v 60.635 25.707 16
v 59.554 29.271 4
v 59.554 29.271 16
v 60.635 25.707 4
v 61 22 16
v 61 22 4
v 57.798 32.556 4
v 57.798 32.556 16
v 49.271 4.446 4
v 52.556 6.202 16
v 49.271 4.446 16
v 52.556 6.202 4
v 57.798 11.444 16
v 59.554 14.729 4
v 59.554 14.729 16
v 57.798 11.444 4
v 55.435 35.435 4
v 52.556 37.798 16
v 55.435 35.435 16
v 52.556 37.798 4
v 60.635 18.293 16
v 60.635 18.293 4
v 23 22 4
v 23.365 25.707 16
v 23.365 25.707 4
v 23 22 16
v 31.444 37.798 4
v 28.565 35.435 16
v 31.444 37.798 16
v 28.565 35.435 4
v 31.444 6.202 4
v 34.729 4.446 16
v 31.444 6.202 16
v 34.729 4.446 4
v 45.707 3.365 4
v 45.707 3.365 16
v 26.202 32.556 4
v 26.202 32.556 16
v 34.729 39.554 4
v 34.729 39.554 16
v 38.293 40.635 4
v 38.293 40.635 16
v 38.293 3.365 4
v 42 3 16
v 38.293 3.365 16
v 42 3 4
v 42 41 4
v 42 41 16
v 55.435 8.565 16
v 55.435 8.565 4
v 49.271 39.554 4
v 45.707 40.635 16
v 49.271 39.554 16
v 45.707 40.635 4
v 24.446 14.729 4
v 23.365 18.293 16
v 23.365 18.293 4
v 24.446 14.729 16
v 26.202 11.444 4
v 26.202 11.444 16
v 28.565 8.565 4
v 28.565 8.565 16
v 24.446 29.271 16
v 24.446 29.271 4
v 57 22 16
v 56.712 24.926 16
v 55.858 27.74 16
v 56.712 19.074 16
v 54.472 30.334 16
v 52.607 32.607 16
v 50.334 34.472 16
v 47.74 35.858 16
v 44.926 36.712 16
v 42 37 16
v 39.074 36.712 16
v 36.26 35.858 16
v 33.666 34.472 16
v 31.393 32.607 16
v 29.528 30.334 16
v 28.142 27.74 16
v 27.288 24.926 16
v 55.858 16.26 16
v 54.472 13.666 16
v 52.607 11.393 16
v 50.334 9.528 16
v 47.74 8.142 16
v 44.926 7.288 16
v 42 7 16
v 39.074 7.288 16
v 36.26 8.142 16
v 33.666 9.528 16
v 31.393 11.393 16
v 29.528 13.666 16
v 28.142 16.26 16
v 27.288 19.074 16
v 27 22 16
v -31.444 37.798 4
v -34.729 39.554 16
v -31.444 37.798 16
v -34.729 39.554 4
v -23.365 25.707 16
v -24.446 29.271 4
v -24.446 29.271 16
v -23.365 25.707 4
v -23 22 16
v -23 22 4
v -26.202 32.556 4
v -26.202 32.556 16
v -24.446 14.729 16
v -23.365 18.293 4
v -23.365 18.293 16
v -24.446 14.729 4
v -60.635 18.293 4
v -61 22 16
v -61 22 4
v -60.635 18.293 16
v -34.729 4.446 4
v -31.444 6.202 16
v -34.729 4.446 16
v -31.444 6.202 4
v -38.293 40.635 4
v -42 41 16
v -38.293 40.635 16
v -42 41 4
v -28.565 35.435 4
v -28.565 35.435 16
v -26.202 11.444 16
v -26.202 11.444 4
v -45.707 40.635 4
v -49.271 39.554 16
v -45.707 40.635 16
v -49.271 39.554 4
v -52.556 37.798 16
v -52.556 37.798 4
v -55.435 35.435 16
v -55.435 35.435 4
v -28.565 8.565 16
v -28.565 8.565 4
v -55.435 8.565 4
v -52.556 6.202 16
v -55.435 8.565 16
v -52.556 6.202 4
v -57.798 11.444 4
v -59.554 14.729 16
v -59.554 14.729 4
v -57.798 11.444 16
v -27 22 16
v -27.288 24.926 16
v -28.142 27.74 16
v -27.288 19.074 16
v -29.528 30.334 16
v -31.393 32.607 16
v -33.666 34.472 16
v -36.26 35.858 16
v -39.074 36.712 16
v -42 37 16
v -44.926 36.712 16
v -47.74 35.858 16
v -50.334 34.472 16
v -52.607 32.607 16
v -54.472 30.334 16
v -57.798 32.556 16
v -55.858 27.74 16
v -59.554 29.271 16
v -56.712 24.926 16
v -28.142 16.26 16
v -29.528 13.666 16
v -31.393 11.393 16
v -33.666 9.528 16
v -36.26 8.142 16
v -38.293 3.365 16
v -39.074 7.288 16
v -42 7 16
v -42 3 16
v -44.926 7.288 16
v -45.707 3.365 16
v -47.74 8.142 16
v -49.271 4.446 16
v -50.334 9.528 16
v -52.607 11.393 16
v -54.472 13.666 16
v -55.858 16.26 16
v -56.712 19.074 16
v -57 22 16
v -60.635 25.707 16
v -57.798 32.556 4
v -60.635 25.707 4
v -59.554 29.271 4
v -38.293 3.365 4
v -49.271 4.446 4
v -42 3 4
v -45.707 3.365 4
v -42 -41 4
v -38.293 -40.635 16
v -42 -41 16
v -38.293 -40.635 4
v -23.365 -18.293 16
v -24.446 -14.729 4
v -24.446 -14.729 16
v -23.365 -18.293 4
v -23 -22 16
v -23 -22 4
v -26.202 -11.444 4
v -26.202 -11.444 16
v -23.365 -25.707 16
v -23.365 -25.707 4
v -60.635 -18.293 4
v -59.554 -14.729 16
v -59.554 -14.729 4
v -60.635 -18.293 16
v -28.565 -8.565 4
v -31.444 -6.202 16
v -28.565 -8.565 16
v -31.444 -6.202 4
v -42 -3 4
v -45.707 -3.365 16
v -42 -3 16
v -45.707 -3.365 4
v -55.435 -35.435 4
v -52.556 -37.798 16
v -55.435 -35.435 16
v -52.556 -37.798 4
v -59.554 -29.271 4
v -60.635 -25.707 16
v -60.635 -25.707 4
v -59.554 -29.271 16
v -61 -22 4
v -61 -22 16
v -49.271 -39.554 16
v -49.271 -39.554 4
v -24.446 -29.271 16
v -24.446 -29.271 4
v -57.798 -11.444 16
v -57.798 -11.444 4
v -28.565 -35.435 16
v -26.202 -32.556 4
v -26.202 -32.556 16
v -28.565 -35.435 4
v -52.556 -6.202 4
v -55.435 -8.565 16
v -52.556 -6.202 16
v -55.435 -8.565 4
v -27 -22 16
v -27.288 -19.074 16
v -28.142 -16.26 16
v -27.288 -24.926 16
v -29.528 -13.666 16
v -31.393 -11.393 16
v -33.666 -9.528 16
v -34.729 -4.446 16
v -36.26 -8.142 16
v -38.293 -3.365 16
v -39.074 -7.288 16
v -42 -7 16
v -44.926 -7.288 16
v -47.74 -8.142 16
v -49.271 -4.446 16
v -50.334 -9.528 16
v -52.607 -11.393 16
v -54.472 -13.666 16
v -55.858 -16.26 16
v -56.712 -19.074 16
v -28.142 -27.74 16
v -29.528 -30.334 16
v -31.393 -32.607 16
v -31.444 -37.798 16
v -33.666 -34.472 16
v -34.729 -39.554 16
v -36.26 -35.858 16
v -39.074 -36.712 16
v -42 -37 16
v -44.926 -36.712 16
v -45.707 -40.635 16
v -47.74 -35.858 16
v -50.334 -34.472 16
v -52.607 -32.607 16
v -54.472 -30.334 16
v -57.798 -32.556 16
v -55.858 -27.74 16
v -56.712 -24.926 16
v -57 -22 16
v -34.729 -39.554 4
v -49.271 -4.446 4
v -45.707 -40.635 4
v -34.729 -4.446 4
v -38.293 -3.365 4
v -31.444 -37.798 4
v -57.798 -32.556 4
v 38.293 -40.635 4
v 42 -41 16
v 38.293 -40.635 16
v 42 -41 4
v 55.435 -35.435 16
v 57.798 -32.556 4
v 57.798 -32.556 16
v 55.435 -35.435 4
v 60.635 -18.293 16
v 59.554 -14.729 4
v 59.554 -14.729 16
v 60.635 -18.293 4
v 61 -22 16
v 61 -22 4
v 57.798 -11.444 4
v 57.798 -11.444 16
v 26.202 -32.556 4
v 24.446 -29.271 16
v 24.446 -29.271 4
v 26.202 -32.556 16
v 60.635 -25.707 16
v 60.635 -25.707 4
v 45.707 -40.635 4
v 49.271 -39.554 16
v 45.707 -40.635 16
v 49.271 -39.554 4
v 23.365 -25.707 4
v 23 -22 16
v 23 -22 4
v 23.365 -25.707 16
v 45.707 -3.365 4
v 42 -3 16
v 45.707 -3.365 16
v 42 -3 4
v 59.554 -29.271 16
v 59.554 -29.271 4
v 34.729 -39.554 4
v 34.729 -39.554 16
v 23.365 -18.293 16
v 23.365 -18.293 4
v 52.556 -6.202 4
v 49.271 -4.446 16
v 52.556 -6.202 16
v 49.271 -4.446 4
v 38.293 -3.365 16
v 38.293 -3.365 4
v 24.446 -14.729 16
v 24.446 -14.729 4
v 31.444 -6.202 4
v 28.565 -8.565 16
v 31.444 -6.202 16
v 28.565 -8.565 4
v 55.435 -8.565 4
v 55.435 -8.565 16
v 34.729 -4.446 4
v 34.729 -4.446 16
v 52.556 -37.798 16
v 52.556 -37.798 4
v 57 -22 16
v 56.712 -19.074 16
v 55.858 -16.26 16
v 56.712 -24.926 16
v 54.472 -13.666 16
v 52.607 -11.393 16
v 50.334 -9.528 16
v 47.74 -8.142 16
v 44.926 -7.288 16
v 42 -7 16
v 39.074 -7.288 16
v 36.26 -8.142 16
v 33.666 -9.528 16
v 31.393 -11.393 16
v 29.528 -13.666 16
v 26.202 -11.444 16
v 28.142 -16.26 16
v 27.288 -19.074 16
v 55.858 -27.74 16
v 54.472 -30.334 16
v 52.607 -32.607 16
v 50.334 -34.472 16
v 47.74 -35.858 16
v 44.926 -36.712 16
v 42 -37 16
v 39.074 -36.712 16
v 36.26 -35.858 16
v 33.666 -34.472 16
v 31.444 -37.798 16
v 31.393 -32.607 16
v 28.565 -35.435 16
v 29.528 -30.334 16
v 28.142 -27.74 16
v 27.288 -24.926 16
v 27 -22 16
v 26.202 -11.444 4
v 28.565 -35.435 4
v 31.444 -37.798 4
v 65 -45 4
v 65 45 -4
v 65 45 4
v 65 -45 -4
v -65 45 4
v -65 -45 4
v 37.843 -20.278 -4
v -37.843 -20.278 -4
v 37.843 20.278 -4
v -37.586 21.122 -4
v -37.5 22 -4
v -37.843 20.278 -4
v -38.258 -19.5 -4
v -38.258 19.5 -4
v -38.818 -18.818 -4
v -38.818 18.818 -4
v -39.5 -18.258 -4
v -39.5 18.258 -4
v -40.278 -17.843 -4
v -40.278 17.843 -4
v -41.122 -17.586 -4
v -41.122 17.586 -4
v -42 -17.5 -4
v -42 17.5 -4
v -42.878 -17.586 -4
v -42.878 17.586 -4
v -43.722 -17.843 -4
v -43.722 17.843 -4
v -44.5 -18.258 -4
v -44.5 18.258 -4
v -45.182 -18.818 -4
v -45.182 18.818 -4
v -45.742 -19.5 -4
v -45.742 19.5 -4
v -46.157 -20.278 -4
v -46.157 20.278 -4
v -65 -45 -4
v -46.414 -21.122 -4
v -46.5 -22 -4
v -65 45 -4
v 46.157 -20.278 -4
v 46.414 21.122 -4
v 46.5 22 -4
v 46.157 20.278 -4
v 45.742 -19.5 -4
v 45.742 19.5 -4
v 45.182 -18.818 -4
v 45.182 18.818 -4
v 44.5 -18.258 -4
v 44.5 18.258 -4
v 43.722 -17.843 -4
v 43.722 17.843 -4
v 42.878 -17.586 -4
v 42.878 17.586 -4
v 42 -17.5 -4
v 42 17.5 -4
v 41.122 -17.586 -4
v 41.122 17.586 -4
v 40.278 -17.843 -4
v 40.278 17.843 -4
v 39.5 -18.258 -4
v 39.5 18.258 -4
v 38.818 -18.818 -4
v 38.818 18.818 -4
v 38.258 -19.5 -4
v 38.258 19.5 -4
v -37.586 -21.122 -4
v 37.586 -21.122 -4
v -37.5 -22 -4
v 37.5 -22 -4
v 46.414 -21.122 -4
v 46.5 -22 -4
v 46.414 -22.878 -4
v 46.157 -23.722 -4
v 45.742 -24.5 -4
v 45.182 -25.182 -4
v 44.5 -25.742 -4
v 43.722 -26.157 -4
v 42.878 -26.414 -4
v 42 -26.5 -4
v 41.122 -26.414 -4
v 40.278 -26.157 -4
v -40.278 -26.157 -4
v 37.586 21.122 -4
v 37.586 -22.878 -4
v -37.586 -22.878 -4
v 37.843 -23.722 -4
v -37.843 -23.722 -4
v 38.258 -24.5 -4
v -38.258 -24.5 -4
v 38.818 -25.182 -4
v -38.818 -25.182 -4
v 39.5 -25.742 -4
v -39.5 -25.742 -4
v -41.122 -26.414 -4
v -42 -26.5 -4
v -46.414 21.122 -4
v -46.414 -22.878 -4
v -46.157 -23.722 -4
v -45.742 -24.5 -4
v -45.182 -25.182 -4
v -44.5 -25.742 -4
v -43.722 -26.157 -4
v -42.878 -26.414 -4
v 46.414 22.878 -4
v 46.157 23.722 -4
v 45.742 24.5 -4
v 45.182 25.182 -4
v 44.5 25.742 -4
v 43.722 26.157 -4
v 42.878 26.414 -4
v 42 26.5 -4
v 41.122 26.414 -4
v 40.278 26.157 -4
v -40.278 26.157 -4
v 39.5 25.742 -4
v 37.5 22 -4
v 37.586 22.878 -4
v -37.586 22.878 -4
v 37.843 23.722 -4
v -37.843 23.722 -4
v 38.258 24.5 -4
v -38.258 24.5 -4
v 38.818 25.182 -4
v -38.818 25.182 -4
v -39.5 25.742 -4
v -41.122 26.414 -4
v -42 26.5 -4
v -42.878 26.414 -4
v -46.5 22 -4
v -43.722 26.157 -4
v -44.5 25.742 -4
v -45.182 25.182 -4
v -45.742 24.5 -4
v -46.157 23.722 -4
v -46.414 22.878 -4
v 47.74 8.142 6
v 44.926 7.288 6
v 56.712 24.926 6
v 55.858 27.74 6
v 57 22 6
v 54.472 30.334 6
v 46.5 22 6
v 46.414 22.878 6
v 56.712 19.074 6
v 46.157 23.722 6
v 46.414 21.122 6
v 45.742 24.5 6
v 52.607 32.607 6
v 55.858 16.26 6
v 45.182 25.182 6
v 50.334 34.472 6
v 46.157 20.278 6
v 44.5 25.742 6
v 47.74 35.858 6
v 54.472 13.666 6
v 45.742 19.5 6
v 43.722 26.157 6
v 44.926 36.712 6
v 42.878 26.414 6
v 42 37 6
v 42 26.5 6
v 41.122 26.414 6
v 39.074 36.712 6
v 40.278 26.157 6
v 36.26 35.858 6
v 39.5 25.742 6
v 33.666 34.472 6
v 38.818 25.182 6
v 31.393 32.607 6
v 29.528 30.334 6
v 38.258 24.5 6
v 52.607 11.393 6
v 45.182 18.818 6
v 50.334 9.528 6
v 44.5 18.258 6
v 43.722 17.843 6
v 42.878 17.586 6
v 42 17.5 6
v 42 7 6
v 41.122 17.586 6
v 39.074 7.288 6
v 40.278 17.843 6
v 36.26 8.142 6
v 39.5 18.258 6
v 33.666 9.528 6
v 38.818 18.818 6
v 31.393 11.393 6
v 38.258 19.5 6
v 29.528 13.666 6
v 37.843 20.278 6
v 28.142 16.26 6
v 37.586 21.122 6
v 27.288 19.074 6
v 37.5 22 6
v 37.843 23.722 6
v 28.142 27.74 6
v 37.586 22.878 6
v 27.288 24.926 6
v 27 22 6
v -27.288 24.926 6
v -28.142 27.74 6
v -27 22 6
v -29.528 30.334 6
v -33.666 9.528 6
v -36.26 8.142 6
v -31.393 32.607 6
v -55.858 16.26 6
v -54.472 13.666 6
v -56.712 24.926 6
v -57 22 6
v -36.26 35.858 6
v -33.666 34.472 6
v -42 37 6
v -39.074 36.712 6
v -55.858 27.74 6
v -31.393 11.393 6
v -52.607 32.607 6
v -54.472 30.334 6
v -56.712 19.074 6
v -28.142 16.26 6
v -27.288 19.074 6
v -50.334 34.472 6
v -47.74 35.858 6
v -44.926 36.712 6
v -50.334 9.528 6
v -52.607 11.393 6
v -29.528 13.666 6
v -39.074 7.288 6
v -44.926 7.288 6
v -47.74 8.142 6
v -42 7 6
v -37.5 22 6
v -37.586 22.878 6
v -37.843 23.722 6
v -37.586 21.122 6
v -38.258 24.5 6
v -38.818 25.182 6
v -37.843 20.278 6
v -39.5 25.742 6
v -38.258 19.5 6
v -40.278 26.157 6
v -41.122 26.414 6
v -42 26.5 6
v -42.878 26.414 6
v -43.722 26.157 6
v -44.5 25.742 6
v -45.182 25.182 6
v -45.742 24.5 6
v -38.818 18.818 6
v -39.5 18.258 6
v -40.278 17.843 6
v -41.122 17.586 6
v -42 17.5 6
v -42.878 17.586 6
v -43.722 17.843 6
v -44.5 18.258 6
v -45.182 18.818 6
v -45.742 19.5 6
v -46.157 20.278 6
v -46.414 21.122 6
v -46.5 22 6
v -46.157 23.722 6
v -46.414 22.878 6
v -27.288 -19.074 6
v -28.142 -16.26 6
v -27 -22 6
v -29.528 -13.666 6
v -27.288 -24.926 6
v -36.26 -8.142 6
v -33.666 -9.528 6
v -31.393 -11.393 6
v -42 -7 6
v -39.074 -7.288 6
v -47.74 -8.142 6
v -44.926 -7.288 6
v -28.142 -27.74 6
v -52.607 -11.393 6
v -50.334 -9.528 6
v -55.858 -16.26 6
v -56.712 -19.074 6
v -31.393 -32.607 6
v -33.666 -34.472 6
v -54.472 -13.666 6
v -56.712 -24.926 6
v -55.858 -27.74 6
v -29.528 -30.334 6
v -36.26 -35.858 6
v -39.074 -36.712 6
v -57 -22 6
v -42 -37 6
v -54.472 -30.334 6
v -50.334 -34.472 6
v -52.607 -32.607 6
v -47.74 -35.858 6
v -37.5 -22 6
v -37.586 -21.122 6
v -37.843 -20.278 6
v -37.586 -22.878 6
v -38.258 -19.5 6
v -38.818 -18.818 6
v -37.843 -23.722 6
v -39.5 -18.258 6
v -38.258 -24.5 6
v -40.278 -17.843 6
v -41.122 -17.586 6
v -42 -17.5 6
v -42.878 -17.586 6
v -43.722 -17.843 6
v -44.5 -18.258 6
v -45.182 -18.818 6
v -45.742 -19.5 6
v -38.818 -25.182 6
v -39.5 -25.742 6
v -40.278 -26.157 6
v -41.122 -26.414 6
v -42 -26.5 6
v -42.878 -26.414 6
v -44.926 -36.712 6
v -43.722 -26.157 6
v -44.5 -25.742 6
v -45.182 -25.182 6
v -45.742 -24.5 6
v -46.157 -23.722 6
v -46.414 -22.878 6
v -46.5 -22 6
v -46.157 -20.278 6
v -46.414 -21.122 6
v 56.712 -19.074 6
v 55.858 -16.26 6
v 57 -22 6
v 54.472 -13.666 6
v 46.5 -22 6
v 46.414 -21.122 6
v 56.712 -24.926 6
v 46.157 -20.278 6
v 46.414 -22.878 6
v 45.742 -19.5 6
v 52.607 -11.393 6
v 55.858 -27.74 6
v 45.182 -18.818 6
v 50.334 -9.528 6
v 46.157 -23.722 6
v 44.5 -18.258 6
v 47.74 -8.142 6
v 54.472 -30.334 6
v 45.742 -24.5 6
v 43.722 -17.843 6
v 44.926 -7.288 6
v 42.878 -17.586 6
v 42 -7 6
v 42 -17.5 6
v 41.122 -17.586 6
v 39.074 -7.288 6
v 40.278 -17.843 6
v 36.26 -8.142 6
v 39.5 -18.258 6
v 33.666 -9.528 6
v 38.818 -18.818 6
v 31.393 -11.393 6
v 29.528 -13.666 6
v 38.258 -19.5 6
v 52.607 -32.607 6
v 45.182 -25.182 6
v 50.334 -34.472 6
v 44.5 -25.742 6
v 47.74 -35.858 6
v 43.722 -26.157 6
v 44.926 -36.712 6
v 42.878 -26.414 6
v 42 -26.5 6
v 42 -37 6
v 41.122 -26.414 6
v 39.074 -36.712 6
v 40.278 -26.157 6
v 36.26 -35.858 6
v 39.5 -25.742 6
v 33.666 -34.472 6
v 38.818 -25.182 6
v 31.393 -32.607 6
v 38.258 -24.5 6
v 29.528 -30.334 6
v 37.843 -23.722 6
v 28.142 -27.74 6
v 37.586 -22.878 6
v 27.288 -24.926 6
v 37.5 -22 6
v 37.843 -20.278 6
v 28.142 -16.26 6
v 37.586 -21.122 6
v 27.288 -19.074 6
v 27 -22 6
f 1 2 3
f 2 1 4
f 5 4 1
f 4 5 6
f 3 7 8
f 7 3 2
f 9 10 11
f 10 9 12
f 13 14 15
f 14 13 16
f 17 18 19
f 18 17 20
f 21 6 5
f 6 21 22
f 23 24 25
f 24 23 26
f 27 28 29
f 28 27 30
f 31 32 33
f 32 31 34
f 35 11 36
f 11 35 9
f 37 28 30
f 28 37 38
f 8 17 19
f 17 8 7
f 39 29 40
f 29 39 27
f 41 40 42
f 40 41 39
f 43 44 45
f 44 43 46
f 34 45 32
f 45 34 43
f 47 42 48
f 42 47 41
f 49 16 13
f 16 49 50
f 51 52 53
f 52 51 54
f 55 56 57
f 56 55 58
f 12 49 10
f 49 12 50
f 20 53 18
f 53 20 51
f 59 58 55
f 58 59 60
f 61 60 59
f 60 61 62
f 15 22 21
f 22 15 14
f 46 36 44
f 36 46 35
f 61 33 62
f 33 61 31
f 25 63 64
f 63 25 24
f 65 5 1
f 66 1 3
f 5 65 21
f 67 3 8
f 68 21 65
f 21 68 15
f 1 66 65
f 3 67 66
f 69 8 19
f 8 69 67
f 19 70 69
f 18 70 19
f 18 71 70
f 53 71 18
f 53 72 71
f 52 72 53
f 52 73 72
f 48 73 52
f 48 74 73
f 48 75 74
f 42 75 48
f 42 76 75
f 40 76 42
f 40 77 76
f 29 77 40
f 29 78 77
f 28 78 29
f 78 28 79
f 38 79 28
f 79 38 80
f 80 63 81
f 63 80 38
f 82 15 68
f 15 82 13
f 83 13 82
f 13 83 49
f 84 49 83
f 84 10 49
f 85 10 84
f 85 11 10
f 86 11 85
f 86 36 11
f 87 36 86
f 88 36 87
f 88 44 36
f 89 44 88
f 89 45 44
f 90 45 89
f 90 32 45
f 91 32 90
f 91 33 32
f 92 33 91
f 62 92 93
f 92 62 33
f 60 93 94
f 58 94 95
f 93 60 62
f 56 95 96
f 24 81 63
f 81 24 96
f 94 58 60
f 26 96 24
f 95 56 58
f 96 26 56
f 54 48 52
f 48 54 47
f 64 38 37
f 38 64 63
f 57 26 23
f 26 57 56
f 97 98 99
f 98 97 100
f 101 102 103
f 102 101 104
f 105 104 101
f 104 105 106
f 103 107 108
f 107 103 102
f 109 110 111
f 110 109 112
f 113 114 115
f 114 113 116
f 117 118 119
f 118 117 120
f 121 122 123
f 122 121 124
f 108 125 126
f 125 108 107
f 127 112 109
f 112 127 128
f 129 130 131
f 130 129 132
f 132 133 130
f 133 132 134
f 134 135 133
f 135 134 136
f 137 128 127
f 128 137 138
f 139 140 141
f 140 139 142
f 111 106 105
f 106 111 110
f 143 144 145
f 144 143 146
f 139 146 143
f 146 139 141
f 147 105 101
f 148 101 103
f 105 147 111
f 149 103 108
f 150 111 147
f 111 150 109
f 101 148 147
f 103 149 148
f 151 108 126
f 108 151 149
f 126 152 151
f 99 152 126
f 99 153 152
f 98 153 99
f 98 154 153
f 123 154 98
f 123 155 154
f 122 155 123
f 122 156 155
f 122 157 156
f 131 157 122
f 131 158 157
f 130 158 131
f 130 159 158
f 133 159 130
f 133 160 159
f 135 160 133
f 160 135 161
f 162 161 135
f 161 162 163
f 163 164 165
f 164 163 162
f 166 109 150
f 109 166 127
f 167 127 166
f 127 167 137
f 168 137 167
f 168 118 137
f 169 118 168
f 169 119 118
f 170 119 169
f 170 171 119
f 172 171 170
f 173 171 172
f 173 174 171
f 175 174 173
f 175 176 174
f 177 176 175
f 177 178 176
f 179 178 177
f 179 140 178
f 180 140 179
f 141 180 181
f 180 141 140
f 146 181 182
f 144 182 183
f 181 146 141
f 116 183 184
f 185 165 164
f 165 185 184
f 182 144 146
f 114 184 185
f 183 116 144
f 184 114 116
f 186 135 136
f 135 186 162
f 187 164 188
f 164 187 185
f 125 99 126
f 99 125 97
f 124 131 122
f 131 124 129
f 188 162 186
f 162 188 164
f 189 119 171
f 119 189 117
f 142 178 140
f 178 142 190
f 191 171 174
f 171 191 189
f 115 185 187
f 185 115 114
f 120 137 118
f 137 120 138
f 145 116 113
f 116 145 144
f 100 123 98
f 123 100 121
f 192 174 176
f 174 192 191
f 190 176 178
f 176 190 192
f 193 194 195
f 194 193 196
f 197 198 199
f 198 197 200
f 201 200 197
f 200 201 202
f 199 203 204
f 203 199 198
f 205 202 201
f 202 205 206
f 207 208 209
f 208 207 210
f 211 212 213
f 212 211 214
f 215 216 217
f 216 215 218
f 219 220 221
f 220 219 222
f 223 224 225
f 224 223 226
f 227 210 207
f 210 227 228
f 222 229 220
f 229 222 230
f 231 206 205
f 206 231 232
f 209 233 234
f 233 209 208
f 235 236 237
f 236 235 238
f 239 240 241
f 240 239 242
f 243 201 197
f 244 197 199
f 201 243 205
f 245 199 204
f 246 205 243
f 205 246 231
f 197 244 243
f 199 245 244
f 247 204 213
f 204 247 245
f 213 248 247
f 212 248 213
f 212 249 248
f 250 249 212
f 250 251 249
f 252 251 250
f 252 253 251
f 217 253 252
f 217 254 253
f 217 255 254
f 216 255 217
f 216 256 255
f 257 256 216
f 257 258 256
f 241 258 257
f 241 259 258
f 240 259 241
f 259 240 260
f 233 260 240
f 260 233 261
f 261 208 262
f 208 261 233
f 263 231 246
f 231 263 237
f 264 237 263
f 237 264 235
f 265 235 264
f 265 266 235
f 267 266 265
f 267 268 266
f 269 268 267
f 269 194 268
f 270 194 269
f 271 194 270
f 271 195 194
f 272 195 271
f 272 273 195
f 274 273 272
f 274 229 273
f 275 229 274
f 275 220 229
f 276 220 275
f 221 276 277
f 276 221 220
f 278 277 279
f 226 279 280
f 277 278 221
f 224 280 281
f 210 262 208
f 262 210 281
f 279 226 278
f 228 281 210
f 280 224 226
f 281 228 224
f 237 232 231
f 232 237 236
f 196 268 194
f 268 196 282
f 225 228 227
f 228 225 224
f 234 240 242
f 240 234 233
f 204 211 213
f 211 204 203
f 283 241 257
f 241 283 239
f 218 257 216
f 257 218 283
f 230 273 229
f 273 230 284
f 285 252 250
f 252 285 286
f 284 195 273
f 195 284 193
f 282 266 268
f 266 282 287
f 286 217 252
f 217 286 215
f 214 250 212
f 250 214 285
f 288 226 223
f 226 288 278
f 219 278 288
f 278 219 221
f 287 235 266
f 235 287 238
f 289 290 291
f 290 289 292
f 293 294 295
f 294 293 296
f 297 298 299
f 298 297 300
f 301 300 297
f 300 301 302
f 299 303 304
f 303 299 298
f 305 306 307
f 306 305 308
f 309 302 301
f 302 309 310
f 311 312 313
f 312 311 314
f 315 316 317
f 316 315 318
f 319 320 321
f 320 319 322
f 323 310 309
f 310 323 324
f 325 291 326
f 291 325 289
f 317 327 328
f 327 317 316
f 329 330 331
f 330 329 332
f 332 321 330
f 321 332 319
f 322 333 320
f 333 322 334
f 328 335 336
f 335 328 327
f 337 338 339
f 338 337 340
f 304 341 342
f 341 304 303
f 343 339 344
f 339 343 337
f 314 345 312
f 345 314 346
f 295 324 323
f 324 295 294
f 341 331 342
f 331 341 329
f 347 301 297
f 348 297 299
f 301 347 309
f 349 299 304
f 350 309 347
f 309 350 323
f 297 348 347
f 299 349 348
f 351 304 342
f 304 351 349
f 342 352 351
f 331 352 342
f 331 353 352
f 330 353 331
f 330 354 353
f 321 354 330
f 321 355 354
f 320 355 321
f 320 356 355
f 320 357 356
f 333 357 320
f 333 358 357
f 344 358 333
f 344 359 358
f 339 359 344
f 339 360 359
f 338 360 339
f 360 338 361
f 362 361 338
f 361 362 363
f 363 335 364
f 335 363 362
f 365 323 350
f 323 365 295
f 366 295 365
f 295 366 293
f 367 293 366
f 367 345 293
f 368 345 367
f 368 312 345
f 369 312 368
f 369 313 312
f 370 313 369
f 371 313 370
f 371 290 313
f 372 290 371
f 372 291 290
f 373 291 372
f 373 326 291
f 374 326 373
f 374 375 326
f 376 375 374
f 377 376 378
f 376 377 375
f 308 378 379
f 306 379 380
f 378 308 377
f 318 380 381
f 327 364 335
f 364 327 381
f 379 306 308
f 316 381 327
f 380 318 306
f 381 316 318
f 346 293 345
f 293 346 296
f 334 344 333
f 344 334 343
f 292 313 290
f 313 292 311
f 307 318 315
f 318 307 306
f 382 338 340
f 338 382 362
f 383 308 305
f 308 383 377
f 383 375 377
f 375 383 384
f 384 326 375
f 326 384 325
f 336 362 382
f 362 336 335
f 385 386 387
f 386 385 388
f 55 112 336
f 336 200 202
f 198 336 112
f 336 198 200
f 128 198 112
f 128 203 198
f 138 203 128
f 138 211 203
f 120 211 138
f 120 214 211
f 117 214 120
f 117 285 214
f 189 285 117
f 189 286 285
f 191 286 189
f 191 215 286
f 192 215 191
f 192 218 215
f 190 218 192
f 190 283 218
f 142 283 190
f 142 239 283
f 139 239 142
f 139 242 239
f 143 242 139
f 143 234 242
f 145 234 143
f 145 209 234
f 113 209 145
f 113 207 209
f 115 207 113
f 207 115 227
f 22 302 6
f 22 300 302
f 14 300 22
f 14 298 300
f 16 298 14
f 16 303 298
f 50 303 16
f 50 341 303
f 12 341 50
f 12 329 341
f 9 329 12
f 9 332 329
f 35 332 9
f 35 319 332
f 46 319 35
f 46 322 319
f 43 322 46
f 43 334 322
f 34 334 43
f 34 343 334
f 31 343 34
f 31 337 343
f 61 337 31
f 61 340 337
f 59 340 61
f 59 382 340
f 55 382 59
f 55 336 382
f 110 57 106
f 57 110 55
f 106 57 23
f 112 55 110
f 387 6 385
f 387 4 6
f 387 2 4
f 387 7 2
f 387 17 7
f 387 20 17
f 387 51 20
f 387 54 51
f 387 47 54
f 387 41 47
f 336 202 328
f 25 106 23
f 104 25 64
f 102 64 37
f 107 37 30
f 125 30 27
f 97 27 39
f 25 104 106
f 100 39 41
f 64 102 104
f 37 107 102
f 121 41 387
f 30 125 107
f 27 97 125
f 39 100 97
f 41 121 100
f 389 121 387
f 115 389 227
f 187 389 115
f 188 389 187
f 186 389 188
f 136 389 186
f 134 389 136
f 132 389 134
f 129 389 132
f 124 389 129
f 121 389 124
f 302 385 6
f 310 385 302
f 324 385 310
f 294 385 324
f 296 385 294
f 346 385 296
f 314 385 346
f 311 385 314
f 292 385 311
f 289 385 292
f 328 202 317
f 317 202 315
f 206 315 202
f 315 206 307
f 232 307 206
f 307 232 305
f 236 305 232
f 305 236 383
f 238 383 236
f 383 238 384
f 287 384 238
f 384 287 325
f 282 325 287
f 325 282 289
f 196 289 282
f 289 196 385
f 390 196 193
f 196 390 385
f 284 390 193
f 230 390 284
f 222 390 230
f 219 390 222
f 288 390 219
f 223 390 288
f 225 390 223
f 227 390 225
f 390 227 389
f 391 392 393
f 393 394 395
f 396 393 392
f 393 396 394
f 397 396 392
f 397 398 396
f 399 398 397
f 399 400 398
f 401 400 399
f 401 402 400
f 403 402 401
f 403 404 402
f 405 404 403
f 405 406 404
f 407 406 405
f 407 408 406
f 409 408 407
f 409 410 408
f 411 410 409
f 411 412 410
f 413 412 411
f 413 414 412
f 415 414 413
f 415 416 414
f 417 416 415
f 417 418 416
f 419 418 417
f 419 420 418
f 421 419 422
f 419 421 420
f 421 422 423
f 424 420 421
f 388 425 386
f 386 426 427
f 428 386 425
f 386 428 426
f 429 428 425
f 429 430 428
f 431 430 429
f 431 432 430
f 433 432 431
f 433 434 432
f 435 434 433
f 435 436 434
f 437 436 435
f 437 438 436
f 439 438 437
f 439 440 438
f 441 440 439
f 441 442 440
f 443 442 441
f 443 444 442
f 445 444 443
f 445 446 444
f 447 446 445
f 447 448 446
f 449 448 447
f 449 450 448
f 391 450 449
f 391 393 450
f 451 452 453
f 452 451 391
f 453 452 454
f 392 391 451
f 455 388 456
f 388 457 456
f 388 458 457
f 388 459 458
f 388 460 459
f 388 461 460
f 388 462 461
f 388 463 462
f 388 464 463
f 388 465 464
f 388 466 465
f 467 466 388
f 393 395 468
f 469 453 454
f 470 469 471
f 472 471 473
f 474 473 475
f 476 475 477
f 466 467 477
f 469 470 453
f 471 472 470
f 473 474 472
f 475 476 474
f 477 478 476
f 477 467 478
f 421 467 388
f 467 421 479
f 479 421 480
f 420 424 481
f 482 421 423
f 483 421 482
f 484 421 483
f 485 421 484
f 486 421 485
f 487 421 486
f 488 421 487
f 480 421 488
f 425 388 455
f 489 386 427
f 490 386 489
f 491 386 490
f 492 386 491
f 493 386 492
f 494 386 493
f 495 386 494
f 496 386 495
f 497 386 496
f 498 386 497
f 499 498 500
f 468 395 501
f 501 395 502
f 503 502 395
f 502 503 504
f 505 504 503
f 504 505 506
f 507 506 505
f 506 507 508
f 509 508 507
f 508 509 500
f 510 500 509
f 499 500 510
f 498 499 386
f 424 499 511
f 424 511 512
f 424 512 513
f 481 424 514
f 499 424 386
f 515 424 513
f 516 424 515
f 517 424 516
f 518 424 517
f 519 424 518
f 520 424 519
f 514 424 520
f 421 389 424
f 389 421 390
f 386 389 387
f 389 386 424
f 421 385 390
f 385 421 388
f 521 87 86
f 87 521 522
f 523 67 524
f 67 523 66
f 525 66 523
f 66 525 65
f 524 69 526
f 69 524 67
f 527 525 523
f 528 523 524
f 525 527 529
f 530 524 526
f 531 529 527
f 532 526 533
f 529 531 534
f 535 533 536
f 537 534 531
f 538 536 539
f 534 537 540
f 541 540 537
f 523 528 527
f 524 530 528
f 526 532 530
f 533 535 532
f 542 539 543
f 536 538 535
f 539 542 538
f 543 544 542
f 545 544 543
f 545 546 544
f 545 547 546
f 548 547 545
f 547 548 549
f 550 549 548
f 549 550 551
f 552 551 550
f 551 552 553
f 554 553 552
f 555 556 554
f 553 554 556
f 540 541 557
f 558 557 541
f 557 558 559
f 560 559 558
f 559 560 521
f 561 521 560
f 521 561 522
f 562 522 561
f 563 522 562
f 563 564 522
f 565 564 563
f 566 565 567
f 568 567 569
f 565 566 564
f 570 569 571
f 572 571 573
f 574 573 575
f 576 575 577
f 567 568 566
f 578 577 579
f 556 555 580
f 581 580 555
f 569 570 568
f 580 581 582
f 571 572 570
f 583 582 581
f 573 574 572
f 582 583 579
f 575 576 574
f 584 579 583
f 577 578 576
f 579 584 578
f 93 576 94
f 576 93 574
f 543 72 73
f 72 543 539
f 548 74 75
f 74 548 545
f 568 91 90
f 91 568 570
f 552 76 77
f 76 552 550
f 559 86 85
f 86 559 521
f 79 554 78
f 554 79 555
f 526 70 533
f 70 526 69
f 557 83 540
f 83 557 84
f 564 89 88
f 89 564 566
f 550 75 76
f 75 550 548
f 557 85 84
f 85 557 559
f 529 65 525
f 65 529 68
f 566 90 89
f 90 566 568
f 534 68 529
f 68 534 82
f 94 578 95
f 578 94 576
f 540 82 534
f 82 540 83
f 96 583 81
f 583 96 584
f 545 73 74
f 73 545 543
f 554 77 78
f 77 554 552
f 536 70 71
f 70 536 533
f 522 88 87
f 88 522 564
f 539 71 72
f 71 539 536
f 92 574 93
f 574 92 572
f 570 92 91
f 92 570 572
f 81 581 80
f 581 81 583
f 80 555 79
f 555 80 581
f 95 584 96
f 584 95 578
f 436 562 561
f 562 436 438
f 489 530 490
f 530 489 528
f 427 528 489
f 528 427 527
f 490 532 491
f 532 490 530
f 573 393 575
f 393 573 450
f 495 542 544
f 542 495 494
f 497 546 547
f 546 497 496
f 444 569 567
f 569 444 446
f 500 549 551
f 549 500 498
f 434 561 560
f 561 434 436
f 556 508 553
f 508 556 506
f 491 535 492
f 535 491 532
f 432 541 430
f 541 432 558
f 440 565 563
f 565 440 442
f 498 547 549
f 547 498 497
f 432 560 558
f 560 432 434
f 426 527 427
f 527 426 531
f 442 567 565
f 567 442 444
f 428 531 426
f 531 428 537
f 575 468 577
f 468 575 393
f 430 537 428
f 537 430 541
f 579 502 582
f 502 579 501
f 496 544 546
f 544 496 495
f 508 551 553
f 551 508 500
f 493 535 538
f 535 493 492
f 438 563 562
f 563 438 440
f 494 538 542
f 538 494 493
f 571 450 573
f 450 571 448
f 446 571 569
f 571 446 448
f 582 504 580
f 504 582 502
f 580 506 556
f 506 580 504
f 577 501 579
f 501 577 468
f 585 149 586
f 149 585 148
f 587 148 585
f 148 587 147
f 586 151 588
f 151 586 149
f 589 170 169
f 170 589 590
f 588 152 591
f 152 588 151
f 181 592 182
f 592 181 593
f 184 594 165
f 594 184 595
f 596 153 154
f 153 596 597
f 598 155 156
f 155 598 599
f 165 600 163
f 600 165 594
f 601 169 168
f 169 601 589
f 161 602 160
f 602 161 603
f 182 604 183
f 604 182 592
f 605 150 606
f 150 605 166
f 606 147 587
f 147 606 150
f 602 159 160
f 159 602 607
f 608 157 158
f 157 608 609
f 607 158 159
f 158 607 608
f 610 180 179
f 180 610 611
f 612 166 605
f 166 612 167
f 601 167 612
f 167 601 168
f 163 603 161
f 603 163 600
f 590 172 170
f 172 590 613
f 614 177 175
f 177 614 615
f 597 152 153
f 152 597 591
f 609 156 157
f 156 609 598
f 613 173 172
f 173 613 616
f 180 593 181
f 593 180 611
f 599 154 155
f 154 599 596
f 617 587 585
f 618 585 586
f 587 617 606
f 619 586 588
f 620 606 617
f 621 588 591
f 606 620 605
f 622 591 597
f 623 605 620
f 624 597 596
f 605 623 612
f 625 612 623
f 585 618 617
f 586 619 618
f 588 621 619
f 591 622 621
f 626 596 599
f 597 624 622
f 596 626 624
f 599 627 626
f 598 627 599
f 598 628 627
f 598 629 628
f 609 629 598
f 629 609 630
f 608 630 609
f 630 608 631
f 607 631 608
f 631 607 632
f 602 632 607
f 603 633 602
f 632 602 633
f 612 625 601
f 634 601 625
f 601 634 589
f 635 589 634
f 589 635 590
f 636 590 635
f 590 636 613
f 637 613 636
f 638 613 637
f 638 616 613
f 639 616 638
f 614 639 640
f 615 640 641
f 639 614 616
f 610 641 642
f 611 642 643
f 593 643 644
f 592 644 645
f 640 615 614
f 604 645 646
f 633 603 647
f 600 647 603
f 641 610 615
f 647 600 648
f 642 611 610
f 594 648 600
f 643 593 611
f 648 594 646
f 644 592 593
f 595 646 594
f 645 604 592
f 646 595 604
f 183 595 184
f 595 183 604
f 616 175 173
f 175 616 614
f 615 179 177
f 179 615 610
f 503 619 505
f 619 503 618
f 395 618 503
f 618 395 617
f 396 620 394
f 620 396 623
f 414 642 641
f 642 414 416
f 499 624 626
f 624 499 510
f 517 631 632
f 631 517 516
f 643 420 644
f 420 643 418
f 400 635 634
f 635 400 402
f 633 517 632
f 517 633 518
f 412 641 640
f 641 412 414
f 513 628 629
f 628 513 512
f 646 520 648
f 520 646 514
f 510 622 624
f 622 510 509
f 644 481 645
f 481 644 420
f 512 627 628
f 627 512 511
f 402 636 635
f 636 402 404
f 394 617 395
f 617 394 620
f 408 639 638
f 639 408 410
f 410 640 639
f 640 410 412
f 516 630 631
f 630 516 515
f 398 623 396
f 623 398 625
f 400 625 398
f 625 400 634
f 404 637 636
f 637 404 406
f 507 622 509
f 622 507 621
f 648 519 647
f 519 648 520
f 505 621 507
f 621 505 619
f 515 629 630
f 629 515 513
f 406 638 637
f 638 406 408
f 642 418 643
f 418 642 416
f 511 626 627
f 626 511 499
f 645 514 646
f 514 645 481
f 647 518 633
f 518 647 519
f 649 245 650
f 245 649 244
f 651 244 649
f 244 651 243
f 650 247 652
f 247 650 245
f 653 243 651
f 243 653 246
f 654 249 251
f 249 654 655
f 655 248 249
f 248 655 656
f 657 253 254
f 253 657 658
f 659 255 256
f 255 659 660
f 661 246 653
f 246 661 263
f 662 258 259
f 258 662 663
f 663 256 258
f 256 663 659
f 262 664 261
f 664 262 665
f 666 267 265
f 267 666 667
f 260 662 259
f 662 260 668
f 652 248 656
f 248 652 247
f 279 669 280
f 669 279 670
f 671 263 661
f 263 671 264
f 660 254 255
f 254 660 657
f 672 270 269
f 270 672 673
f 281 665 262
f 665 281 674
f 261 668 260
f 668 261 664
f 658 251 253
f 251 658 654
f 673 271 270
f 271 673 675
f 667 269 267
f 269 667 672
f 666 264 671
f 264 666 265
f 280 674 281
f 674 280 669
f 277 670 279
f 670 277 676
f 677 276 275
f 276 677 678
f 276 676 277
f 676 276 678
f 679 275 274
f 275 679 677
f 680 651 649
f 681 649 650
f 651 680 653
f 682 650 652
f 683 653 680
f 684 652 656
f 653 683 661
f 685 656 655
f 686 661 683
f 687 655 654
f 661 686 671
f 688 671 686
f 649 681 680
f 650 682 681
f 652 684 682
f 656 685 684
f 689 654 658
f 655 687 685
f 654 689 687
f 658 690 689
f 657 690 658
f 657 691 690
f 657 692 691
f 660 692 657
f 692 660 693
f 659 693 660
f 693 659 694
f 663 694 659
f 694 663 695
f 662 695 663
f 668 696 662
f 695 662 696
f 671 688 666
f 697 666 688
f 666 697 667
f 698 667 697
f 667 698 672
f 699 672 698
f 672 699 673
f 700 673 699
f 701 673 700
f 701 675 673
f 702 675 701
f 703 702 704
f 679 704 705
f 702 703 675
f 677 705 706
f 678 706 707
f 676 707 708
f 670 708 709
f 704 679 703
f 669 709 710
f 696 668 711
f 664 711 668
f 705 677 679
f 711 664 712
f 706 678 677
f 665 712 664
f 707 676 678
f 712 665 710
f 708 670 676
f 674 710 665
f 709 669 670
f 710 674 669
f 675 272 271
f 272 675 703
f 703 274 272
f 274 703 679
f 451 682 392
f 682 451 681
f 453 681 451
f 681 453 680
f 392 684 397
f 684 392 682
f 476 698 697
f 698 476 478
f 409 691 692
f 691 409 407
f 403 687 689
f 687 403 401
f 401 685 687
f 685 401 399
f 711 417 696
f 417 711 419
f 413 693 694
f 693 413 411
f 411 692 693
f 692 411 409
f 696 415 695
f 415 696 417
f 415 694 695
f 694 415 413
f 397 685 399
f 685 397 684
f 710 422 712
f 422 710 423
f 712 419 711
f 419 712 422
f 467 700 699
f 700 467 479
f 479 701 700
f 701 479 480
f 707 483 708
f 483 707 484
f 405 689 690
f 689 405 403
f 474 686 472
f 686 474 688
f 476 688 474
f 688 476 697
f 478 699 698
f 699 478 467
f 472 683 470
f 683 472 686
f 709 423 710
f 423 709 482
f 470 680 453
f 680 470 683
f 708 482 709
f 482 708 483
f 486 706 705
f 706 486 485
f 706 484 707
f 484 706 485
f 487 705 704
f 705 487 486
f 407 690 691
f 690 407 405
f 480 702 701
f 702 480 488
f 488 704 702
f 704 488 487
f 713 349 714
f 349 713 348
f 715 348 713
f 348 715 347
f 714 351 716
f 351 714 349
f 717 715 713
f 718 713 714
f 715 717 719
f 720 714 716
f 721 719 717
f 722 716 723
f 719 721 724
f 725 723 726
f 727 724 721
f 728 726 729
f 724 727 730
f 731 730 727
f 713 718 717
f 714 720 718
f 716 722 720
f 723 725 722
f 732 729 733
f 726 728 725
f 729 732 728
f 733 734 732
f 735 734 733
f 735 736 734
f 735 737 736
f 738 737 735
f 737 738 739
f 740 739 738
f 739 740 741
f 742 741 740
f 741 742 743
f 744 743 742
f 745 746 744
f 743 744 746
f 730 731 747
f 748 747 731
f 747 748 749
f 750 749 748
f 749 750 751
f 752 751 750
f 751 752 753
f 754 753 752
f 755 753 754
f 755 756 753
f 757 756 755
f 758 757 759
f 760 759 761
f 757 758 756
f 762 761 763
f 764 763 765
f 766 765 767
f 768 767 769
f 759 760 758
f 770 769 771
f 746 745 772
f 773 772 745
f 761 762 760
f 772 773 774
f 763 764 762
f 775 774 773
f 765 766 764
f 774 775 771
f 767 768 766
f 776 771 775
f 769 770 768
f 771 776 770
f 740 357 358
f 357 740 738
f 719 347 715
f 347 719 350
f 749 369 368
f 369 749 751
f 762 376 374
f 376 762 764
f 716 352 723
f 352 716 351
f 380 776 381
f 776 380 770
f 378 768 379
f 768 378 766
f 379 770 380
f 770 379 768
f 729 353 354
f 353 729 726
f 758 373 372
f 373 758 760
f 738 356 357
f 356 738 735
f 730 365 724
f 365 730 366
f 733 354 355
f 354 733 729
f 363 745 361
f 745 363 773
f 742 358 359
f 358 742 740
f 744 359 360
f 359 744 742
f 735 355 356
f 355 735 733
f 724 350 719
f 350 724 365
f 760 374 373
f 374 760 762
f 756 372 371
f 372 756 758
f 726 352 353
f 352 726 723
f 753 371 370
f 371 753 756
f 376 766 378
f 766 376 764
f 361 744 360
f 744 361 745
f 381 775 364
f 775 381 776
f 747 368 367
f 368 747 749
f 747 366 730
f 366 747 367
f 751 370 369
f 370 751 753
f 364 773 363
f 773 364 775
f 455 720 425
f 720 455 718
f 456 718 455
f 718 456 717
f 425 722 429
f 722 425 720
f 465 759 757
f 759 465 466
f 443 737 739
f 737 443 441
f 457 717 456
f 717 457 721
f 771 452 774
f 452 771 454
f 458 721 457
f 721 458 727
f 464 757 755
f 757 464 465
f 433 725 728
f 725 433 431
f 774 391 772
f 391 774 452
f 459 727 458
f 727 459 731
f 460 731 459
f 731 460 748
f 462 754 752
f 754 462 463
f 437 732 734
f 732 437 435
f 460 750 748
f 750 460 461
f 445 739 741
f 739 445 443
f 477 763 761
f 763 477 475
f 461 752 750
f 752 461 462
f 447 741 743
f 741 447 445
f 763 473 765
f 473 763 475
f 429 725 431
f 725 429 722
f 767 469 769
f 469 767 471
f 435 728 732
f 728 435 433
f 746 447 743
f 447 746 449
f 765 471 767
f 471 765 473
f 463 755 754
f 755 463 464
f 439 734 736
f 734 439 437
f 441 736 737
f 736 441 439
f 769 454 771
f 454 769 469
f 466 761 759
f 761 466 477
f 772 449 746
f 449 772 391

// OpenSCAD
$fn = 32;

// ----------------------------------------------------------------------
// Socket pad plate
// bosses with counterbored sockets for the screws
// ----------------------------------------------------------------------

// --- parameters (mm) ---
base_t = 8;            // base plate thickness
boss_h = 12;           // boss height above the base plate
boss_d = 38;           // boss diameter
socket_d = 30;         // socket diameter
socket_depth = 10;     // socket depth from the boss face
bolt_d = 9;            // screw clearance hole through the socket floor
plate = [130, 90, 8];  // overall size (x, y, z)
edge = 23;             // boss centre offset from the plate edge
pads = 4;              // boss count, one per corner

// --- derived feature positions (mm) ---
height = base_t + boss_h;        // = 20   overall height of the part
corner_x = plate[0] / 2 - edge;  // = 42   boss centre X
corner_y = plate[1] / 2 - edge;  // = 22   boss centre Y
feature_centers = [
  [corner_x, corner_y],
  [-corner_x, corner_y],
  [-corner_x, -corner_y],
  [corner_x, -corner_y]
];   // boss centres: sockets, holes and the pads themselves are placed from here

// base plate, bosses on feature_centers, socket + through hole in each
difference() {
  union() {
    cube(plate, center = true);
    for (centre = feature_centers)
      translate([centre[0], centre[1], plate[2] / 2 - 1])
        cylinder(d = boss_d, h = boss_h + 1);
  }
  for (centre = feature_centers) {
    translate([centre[0], centre[1], plate[2] / 2 + boss_h - socket_depth])
      cylinder(d = socket_d, h = socket_depth + 1);
    translate([centre[0], centre[1], -height])
      cylinder(d = bolt_d, h = 2 * height + 2);  // through the socket floor
  }
}
